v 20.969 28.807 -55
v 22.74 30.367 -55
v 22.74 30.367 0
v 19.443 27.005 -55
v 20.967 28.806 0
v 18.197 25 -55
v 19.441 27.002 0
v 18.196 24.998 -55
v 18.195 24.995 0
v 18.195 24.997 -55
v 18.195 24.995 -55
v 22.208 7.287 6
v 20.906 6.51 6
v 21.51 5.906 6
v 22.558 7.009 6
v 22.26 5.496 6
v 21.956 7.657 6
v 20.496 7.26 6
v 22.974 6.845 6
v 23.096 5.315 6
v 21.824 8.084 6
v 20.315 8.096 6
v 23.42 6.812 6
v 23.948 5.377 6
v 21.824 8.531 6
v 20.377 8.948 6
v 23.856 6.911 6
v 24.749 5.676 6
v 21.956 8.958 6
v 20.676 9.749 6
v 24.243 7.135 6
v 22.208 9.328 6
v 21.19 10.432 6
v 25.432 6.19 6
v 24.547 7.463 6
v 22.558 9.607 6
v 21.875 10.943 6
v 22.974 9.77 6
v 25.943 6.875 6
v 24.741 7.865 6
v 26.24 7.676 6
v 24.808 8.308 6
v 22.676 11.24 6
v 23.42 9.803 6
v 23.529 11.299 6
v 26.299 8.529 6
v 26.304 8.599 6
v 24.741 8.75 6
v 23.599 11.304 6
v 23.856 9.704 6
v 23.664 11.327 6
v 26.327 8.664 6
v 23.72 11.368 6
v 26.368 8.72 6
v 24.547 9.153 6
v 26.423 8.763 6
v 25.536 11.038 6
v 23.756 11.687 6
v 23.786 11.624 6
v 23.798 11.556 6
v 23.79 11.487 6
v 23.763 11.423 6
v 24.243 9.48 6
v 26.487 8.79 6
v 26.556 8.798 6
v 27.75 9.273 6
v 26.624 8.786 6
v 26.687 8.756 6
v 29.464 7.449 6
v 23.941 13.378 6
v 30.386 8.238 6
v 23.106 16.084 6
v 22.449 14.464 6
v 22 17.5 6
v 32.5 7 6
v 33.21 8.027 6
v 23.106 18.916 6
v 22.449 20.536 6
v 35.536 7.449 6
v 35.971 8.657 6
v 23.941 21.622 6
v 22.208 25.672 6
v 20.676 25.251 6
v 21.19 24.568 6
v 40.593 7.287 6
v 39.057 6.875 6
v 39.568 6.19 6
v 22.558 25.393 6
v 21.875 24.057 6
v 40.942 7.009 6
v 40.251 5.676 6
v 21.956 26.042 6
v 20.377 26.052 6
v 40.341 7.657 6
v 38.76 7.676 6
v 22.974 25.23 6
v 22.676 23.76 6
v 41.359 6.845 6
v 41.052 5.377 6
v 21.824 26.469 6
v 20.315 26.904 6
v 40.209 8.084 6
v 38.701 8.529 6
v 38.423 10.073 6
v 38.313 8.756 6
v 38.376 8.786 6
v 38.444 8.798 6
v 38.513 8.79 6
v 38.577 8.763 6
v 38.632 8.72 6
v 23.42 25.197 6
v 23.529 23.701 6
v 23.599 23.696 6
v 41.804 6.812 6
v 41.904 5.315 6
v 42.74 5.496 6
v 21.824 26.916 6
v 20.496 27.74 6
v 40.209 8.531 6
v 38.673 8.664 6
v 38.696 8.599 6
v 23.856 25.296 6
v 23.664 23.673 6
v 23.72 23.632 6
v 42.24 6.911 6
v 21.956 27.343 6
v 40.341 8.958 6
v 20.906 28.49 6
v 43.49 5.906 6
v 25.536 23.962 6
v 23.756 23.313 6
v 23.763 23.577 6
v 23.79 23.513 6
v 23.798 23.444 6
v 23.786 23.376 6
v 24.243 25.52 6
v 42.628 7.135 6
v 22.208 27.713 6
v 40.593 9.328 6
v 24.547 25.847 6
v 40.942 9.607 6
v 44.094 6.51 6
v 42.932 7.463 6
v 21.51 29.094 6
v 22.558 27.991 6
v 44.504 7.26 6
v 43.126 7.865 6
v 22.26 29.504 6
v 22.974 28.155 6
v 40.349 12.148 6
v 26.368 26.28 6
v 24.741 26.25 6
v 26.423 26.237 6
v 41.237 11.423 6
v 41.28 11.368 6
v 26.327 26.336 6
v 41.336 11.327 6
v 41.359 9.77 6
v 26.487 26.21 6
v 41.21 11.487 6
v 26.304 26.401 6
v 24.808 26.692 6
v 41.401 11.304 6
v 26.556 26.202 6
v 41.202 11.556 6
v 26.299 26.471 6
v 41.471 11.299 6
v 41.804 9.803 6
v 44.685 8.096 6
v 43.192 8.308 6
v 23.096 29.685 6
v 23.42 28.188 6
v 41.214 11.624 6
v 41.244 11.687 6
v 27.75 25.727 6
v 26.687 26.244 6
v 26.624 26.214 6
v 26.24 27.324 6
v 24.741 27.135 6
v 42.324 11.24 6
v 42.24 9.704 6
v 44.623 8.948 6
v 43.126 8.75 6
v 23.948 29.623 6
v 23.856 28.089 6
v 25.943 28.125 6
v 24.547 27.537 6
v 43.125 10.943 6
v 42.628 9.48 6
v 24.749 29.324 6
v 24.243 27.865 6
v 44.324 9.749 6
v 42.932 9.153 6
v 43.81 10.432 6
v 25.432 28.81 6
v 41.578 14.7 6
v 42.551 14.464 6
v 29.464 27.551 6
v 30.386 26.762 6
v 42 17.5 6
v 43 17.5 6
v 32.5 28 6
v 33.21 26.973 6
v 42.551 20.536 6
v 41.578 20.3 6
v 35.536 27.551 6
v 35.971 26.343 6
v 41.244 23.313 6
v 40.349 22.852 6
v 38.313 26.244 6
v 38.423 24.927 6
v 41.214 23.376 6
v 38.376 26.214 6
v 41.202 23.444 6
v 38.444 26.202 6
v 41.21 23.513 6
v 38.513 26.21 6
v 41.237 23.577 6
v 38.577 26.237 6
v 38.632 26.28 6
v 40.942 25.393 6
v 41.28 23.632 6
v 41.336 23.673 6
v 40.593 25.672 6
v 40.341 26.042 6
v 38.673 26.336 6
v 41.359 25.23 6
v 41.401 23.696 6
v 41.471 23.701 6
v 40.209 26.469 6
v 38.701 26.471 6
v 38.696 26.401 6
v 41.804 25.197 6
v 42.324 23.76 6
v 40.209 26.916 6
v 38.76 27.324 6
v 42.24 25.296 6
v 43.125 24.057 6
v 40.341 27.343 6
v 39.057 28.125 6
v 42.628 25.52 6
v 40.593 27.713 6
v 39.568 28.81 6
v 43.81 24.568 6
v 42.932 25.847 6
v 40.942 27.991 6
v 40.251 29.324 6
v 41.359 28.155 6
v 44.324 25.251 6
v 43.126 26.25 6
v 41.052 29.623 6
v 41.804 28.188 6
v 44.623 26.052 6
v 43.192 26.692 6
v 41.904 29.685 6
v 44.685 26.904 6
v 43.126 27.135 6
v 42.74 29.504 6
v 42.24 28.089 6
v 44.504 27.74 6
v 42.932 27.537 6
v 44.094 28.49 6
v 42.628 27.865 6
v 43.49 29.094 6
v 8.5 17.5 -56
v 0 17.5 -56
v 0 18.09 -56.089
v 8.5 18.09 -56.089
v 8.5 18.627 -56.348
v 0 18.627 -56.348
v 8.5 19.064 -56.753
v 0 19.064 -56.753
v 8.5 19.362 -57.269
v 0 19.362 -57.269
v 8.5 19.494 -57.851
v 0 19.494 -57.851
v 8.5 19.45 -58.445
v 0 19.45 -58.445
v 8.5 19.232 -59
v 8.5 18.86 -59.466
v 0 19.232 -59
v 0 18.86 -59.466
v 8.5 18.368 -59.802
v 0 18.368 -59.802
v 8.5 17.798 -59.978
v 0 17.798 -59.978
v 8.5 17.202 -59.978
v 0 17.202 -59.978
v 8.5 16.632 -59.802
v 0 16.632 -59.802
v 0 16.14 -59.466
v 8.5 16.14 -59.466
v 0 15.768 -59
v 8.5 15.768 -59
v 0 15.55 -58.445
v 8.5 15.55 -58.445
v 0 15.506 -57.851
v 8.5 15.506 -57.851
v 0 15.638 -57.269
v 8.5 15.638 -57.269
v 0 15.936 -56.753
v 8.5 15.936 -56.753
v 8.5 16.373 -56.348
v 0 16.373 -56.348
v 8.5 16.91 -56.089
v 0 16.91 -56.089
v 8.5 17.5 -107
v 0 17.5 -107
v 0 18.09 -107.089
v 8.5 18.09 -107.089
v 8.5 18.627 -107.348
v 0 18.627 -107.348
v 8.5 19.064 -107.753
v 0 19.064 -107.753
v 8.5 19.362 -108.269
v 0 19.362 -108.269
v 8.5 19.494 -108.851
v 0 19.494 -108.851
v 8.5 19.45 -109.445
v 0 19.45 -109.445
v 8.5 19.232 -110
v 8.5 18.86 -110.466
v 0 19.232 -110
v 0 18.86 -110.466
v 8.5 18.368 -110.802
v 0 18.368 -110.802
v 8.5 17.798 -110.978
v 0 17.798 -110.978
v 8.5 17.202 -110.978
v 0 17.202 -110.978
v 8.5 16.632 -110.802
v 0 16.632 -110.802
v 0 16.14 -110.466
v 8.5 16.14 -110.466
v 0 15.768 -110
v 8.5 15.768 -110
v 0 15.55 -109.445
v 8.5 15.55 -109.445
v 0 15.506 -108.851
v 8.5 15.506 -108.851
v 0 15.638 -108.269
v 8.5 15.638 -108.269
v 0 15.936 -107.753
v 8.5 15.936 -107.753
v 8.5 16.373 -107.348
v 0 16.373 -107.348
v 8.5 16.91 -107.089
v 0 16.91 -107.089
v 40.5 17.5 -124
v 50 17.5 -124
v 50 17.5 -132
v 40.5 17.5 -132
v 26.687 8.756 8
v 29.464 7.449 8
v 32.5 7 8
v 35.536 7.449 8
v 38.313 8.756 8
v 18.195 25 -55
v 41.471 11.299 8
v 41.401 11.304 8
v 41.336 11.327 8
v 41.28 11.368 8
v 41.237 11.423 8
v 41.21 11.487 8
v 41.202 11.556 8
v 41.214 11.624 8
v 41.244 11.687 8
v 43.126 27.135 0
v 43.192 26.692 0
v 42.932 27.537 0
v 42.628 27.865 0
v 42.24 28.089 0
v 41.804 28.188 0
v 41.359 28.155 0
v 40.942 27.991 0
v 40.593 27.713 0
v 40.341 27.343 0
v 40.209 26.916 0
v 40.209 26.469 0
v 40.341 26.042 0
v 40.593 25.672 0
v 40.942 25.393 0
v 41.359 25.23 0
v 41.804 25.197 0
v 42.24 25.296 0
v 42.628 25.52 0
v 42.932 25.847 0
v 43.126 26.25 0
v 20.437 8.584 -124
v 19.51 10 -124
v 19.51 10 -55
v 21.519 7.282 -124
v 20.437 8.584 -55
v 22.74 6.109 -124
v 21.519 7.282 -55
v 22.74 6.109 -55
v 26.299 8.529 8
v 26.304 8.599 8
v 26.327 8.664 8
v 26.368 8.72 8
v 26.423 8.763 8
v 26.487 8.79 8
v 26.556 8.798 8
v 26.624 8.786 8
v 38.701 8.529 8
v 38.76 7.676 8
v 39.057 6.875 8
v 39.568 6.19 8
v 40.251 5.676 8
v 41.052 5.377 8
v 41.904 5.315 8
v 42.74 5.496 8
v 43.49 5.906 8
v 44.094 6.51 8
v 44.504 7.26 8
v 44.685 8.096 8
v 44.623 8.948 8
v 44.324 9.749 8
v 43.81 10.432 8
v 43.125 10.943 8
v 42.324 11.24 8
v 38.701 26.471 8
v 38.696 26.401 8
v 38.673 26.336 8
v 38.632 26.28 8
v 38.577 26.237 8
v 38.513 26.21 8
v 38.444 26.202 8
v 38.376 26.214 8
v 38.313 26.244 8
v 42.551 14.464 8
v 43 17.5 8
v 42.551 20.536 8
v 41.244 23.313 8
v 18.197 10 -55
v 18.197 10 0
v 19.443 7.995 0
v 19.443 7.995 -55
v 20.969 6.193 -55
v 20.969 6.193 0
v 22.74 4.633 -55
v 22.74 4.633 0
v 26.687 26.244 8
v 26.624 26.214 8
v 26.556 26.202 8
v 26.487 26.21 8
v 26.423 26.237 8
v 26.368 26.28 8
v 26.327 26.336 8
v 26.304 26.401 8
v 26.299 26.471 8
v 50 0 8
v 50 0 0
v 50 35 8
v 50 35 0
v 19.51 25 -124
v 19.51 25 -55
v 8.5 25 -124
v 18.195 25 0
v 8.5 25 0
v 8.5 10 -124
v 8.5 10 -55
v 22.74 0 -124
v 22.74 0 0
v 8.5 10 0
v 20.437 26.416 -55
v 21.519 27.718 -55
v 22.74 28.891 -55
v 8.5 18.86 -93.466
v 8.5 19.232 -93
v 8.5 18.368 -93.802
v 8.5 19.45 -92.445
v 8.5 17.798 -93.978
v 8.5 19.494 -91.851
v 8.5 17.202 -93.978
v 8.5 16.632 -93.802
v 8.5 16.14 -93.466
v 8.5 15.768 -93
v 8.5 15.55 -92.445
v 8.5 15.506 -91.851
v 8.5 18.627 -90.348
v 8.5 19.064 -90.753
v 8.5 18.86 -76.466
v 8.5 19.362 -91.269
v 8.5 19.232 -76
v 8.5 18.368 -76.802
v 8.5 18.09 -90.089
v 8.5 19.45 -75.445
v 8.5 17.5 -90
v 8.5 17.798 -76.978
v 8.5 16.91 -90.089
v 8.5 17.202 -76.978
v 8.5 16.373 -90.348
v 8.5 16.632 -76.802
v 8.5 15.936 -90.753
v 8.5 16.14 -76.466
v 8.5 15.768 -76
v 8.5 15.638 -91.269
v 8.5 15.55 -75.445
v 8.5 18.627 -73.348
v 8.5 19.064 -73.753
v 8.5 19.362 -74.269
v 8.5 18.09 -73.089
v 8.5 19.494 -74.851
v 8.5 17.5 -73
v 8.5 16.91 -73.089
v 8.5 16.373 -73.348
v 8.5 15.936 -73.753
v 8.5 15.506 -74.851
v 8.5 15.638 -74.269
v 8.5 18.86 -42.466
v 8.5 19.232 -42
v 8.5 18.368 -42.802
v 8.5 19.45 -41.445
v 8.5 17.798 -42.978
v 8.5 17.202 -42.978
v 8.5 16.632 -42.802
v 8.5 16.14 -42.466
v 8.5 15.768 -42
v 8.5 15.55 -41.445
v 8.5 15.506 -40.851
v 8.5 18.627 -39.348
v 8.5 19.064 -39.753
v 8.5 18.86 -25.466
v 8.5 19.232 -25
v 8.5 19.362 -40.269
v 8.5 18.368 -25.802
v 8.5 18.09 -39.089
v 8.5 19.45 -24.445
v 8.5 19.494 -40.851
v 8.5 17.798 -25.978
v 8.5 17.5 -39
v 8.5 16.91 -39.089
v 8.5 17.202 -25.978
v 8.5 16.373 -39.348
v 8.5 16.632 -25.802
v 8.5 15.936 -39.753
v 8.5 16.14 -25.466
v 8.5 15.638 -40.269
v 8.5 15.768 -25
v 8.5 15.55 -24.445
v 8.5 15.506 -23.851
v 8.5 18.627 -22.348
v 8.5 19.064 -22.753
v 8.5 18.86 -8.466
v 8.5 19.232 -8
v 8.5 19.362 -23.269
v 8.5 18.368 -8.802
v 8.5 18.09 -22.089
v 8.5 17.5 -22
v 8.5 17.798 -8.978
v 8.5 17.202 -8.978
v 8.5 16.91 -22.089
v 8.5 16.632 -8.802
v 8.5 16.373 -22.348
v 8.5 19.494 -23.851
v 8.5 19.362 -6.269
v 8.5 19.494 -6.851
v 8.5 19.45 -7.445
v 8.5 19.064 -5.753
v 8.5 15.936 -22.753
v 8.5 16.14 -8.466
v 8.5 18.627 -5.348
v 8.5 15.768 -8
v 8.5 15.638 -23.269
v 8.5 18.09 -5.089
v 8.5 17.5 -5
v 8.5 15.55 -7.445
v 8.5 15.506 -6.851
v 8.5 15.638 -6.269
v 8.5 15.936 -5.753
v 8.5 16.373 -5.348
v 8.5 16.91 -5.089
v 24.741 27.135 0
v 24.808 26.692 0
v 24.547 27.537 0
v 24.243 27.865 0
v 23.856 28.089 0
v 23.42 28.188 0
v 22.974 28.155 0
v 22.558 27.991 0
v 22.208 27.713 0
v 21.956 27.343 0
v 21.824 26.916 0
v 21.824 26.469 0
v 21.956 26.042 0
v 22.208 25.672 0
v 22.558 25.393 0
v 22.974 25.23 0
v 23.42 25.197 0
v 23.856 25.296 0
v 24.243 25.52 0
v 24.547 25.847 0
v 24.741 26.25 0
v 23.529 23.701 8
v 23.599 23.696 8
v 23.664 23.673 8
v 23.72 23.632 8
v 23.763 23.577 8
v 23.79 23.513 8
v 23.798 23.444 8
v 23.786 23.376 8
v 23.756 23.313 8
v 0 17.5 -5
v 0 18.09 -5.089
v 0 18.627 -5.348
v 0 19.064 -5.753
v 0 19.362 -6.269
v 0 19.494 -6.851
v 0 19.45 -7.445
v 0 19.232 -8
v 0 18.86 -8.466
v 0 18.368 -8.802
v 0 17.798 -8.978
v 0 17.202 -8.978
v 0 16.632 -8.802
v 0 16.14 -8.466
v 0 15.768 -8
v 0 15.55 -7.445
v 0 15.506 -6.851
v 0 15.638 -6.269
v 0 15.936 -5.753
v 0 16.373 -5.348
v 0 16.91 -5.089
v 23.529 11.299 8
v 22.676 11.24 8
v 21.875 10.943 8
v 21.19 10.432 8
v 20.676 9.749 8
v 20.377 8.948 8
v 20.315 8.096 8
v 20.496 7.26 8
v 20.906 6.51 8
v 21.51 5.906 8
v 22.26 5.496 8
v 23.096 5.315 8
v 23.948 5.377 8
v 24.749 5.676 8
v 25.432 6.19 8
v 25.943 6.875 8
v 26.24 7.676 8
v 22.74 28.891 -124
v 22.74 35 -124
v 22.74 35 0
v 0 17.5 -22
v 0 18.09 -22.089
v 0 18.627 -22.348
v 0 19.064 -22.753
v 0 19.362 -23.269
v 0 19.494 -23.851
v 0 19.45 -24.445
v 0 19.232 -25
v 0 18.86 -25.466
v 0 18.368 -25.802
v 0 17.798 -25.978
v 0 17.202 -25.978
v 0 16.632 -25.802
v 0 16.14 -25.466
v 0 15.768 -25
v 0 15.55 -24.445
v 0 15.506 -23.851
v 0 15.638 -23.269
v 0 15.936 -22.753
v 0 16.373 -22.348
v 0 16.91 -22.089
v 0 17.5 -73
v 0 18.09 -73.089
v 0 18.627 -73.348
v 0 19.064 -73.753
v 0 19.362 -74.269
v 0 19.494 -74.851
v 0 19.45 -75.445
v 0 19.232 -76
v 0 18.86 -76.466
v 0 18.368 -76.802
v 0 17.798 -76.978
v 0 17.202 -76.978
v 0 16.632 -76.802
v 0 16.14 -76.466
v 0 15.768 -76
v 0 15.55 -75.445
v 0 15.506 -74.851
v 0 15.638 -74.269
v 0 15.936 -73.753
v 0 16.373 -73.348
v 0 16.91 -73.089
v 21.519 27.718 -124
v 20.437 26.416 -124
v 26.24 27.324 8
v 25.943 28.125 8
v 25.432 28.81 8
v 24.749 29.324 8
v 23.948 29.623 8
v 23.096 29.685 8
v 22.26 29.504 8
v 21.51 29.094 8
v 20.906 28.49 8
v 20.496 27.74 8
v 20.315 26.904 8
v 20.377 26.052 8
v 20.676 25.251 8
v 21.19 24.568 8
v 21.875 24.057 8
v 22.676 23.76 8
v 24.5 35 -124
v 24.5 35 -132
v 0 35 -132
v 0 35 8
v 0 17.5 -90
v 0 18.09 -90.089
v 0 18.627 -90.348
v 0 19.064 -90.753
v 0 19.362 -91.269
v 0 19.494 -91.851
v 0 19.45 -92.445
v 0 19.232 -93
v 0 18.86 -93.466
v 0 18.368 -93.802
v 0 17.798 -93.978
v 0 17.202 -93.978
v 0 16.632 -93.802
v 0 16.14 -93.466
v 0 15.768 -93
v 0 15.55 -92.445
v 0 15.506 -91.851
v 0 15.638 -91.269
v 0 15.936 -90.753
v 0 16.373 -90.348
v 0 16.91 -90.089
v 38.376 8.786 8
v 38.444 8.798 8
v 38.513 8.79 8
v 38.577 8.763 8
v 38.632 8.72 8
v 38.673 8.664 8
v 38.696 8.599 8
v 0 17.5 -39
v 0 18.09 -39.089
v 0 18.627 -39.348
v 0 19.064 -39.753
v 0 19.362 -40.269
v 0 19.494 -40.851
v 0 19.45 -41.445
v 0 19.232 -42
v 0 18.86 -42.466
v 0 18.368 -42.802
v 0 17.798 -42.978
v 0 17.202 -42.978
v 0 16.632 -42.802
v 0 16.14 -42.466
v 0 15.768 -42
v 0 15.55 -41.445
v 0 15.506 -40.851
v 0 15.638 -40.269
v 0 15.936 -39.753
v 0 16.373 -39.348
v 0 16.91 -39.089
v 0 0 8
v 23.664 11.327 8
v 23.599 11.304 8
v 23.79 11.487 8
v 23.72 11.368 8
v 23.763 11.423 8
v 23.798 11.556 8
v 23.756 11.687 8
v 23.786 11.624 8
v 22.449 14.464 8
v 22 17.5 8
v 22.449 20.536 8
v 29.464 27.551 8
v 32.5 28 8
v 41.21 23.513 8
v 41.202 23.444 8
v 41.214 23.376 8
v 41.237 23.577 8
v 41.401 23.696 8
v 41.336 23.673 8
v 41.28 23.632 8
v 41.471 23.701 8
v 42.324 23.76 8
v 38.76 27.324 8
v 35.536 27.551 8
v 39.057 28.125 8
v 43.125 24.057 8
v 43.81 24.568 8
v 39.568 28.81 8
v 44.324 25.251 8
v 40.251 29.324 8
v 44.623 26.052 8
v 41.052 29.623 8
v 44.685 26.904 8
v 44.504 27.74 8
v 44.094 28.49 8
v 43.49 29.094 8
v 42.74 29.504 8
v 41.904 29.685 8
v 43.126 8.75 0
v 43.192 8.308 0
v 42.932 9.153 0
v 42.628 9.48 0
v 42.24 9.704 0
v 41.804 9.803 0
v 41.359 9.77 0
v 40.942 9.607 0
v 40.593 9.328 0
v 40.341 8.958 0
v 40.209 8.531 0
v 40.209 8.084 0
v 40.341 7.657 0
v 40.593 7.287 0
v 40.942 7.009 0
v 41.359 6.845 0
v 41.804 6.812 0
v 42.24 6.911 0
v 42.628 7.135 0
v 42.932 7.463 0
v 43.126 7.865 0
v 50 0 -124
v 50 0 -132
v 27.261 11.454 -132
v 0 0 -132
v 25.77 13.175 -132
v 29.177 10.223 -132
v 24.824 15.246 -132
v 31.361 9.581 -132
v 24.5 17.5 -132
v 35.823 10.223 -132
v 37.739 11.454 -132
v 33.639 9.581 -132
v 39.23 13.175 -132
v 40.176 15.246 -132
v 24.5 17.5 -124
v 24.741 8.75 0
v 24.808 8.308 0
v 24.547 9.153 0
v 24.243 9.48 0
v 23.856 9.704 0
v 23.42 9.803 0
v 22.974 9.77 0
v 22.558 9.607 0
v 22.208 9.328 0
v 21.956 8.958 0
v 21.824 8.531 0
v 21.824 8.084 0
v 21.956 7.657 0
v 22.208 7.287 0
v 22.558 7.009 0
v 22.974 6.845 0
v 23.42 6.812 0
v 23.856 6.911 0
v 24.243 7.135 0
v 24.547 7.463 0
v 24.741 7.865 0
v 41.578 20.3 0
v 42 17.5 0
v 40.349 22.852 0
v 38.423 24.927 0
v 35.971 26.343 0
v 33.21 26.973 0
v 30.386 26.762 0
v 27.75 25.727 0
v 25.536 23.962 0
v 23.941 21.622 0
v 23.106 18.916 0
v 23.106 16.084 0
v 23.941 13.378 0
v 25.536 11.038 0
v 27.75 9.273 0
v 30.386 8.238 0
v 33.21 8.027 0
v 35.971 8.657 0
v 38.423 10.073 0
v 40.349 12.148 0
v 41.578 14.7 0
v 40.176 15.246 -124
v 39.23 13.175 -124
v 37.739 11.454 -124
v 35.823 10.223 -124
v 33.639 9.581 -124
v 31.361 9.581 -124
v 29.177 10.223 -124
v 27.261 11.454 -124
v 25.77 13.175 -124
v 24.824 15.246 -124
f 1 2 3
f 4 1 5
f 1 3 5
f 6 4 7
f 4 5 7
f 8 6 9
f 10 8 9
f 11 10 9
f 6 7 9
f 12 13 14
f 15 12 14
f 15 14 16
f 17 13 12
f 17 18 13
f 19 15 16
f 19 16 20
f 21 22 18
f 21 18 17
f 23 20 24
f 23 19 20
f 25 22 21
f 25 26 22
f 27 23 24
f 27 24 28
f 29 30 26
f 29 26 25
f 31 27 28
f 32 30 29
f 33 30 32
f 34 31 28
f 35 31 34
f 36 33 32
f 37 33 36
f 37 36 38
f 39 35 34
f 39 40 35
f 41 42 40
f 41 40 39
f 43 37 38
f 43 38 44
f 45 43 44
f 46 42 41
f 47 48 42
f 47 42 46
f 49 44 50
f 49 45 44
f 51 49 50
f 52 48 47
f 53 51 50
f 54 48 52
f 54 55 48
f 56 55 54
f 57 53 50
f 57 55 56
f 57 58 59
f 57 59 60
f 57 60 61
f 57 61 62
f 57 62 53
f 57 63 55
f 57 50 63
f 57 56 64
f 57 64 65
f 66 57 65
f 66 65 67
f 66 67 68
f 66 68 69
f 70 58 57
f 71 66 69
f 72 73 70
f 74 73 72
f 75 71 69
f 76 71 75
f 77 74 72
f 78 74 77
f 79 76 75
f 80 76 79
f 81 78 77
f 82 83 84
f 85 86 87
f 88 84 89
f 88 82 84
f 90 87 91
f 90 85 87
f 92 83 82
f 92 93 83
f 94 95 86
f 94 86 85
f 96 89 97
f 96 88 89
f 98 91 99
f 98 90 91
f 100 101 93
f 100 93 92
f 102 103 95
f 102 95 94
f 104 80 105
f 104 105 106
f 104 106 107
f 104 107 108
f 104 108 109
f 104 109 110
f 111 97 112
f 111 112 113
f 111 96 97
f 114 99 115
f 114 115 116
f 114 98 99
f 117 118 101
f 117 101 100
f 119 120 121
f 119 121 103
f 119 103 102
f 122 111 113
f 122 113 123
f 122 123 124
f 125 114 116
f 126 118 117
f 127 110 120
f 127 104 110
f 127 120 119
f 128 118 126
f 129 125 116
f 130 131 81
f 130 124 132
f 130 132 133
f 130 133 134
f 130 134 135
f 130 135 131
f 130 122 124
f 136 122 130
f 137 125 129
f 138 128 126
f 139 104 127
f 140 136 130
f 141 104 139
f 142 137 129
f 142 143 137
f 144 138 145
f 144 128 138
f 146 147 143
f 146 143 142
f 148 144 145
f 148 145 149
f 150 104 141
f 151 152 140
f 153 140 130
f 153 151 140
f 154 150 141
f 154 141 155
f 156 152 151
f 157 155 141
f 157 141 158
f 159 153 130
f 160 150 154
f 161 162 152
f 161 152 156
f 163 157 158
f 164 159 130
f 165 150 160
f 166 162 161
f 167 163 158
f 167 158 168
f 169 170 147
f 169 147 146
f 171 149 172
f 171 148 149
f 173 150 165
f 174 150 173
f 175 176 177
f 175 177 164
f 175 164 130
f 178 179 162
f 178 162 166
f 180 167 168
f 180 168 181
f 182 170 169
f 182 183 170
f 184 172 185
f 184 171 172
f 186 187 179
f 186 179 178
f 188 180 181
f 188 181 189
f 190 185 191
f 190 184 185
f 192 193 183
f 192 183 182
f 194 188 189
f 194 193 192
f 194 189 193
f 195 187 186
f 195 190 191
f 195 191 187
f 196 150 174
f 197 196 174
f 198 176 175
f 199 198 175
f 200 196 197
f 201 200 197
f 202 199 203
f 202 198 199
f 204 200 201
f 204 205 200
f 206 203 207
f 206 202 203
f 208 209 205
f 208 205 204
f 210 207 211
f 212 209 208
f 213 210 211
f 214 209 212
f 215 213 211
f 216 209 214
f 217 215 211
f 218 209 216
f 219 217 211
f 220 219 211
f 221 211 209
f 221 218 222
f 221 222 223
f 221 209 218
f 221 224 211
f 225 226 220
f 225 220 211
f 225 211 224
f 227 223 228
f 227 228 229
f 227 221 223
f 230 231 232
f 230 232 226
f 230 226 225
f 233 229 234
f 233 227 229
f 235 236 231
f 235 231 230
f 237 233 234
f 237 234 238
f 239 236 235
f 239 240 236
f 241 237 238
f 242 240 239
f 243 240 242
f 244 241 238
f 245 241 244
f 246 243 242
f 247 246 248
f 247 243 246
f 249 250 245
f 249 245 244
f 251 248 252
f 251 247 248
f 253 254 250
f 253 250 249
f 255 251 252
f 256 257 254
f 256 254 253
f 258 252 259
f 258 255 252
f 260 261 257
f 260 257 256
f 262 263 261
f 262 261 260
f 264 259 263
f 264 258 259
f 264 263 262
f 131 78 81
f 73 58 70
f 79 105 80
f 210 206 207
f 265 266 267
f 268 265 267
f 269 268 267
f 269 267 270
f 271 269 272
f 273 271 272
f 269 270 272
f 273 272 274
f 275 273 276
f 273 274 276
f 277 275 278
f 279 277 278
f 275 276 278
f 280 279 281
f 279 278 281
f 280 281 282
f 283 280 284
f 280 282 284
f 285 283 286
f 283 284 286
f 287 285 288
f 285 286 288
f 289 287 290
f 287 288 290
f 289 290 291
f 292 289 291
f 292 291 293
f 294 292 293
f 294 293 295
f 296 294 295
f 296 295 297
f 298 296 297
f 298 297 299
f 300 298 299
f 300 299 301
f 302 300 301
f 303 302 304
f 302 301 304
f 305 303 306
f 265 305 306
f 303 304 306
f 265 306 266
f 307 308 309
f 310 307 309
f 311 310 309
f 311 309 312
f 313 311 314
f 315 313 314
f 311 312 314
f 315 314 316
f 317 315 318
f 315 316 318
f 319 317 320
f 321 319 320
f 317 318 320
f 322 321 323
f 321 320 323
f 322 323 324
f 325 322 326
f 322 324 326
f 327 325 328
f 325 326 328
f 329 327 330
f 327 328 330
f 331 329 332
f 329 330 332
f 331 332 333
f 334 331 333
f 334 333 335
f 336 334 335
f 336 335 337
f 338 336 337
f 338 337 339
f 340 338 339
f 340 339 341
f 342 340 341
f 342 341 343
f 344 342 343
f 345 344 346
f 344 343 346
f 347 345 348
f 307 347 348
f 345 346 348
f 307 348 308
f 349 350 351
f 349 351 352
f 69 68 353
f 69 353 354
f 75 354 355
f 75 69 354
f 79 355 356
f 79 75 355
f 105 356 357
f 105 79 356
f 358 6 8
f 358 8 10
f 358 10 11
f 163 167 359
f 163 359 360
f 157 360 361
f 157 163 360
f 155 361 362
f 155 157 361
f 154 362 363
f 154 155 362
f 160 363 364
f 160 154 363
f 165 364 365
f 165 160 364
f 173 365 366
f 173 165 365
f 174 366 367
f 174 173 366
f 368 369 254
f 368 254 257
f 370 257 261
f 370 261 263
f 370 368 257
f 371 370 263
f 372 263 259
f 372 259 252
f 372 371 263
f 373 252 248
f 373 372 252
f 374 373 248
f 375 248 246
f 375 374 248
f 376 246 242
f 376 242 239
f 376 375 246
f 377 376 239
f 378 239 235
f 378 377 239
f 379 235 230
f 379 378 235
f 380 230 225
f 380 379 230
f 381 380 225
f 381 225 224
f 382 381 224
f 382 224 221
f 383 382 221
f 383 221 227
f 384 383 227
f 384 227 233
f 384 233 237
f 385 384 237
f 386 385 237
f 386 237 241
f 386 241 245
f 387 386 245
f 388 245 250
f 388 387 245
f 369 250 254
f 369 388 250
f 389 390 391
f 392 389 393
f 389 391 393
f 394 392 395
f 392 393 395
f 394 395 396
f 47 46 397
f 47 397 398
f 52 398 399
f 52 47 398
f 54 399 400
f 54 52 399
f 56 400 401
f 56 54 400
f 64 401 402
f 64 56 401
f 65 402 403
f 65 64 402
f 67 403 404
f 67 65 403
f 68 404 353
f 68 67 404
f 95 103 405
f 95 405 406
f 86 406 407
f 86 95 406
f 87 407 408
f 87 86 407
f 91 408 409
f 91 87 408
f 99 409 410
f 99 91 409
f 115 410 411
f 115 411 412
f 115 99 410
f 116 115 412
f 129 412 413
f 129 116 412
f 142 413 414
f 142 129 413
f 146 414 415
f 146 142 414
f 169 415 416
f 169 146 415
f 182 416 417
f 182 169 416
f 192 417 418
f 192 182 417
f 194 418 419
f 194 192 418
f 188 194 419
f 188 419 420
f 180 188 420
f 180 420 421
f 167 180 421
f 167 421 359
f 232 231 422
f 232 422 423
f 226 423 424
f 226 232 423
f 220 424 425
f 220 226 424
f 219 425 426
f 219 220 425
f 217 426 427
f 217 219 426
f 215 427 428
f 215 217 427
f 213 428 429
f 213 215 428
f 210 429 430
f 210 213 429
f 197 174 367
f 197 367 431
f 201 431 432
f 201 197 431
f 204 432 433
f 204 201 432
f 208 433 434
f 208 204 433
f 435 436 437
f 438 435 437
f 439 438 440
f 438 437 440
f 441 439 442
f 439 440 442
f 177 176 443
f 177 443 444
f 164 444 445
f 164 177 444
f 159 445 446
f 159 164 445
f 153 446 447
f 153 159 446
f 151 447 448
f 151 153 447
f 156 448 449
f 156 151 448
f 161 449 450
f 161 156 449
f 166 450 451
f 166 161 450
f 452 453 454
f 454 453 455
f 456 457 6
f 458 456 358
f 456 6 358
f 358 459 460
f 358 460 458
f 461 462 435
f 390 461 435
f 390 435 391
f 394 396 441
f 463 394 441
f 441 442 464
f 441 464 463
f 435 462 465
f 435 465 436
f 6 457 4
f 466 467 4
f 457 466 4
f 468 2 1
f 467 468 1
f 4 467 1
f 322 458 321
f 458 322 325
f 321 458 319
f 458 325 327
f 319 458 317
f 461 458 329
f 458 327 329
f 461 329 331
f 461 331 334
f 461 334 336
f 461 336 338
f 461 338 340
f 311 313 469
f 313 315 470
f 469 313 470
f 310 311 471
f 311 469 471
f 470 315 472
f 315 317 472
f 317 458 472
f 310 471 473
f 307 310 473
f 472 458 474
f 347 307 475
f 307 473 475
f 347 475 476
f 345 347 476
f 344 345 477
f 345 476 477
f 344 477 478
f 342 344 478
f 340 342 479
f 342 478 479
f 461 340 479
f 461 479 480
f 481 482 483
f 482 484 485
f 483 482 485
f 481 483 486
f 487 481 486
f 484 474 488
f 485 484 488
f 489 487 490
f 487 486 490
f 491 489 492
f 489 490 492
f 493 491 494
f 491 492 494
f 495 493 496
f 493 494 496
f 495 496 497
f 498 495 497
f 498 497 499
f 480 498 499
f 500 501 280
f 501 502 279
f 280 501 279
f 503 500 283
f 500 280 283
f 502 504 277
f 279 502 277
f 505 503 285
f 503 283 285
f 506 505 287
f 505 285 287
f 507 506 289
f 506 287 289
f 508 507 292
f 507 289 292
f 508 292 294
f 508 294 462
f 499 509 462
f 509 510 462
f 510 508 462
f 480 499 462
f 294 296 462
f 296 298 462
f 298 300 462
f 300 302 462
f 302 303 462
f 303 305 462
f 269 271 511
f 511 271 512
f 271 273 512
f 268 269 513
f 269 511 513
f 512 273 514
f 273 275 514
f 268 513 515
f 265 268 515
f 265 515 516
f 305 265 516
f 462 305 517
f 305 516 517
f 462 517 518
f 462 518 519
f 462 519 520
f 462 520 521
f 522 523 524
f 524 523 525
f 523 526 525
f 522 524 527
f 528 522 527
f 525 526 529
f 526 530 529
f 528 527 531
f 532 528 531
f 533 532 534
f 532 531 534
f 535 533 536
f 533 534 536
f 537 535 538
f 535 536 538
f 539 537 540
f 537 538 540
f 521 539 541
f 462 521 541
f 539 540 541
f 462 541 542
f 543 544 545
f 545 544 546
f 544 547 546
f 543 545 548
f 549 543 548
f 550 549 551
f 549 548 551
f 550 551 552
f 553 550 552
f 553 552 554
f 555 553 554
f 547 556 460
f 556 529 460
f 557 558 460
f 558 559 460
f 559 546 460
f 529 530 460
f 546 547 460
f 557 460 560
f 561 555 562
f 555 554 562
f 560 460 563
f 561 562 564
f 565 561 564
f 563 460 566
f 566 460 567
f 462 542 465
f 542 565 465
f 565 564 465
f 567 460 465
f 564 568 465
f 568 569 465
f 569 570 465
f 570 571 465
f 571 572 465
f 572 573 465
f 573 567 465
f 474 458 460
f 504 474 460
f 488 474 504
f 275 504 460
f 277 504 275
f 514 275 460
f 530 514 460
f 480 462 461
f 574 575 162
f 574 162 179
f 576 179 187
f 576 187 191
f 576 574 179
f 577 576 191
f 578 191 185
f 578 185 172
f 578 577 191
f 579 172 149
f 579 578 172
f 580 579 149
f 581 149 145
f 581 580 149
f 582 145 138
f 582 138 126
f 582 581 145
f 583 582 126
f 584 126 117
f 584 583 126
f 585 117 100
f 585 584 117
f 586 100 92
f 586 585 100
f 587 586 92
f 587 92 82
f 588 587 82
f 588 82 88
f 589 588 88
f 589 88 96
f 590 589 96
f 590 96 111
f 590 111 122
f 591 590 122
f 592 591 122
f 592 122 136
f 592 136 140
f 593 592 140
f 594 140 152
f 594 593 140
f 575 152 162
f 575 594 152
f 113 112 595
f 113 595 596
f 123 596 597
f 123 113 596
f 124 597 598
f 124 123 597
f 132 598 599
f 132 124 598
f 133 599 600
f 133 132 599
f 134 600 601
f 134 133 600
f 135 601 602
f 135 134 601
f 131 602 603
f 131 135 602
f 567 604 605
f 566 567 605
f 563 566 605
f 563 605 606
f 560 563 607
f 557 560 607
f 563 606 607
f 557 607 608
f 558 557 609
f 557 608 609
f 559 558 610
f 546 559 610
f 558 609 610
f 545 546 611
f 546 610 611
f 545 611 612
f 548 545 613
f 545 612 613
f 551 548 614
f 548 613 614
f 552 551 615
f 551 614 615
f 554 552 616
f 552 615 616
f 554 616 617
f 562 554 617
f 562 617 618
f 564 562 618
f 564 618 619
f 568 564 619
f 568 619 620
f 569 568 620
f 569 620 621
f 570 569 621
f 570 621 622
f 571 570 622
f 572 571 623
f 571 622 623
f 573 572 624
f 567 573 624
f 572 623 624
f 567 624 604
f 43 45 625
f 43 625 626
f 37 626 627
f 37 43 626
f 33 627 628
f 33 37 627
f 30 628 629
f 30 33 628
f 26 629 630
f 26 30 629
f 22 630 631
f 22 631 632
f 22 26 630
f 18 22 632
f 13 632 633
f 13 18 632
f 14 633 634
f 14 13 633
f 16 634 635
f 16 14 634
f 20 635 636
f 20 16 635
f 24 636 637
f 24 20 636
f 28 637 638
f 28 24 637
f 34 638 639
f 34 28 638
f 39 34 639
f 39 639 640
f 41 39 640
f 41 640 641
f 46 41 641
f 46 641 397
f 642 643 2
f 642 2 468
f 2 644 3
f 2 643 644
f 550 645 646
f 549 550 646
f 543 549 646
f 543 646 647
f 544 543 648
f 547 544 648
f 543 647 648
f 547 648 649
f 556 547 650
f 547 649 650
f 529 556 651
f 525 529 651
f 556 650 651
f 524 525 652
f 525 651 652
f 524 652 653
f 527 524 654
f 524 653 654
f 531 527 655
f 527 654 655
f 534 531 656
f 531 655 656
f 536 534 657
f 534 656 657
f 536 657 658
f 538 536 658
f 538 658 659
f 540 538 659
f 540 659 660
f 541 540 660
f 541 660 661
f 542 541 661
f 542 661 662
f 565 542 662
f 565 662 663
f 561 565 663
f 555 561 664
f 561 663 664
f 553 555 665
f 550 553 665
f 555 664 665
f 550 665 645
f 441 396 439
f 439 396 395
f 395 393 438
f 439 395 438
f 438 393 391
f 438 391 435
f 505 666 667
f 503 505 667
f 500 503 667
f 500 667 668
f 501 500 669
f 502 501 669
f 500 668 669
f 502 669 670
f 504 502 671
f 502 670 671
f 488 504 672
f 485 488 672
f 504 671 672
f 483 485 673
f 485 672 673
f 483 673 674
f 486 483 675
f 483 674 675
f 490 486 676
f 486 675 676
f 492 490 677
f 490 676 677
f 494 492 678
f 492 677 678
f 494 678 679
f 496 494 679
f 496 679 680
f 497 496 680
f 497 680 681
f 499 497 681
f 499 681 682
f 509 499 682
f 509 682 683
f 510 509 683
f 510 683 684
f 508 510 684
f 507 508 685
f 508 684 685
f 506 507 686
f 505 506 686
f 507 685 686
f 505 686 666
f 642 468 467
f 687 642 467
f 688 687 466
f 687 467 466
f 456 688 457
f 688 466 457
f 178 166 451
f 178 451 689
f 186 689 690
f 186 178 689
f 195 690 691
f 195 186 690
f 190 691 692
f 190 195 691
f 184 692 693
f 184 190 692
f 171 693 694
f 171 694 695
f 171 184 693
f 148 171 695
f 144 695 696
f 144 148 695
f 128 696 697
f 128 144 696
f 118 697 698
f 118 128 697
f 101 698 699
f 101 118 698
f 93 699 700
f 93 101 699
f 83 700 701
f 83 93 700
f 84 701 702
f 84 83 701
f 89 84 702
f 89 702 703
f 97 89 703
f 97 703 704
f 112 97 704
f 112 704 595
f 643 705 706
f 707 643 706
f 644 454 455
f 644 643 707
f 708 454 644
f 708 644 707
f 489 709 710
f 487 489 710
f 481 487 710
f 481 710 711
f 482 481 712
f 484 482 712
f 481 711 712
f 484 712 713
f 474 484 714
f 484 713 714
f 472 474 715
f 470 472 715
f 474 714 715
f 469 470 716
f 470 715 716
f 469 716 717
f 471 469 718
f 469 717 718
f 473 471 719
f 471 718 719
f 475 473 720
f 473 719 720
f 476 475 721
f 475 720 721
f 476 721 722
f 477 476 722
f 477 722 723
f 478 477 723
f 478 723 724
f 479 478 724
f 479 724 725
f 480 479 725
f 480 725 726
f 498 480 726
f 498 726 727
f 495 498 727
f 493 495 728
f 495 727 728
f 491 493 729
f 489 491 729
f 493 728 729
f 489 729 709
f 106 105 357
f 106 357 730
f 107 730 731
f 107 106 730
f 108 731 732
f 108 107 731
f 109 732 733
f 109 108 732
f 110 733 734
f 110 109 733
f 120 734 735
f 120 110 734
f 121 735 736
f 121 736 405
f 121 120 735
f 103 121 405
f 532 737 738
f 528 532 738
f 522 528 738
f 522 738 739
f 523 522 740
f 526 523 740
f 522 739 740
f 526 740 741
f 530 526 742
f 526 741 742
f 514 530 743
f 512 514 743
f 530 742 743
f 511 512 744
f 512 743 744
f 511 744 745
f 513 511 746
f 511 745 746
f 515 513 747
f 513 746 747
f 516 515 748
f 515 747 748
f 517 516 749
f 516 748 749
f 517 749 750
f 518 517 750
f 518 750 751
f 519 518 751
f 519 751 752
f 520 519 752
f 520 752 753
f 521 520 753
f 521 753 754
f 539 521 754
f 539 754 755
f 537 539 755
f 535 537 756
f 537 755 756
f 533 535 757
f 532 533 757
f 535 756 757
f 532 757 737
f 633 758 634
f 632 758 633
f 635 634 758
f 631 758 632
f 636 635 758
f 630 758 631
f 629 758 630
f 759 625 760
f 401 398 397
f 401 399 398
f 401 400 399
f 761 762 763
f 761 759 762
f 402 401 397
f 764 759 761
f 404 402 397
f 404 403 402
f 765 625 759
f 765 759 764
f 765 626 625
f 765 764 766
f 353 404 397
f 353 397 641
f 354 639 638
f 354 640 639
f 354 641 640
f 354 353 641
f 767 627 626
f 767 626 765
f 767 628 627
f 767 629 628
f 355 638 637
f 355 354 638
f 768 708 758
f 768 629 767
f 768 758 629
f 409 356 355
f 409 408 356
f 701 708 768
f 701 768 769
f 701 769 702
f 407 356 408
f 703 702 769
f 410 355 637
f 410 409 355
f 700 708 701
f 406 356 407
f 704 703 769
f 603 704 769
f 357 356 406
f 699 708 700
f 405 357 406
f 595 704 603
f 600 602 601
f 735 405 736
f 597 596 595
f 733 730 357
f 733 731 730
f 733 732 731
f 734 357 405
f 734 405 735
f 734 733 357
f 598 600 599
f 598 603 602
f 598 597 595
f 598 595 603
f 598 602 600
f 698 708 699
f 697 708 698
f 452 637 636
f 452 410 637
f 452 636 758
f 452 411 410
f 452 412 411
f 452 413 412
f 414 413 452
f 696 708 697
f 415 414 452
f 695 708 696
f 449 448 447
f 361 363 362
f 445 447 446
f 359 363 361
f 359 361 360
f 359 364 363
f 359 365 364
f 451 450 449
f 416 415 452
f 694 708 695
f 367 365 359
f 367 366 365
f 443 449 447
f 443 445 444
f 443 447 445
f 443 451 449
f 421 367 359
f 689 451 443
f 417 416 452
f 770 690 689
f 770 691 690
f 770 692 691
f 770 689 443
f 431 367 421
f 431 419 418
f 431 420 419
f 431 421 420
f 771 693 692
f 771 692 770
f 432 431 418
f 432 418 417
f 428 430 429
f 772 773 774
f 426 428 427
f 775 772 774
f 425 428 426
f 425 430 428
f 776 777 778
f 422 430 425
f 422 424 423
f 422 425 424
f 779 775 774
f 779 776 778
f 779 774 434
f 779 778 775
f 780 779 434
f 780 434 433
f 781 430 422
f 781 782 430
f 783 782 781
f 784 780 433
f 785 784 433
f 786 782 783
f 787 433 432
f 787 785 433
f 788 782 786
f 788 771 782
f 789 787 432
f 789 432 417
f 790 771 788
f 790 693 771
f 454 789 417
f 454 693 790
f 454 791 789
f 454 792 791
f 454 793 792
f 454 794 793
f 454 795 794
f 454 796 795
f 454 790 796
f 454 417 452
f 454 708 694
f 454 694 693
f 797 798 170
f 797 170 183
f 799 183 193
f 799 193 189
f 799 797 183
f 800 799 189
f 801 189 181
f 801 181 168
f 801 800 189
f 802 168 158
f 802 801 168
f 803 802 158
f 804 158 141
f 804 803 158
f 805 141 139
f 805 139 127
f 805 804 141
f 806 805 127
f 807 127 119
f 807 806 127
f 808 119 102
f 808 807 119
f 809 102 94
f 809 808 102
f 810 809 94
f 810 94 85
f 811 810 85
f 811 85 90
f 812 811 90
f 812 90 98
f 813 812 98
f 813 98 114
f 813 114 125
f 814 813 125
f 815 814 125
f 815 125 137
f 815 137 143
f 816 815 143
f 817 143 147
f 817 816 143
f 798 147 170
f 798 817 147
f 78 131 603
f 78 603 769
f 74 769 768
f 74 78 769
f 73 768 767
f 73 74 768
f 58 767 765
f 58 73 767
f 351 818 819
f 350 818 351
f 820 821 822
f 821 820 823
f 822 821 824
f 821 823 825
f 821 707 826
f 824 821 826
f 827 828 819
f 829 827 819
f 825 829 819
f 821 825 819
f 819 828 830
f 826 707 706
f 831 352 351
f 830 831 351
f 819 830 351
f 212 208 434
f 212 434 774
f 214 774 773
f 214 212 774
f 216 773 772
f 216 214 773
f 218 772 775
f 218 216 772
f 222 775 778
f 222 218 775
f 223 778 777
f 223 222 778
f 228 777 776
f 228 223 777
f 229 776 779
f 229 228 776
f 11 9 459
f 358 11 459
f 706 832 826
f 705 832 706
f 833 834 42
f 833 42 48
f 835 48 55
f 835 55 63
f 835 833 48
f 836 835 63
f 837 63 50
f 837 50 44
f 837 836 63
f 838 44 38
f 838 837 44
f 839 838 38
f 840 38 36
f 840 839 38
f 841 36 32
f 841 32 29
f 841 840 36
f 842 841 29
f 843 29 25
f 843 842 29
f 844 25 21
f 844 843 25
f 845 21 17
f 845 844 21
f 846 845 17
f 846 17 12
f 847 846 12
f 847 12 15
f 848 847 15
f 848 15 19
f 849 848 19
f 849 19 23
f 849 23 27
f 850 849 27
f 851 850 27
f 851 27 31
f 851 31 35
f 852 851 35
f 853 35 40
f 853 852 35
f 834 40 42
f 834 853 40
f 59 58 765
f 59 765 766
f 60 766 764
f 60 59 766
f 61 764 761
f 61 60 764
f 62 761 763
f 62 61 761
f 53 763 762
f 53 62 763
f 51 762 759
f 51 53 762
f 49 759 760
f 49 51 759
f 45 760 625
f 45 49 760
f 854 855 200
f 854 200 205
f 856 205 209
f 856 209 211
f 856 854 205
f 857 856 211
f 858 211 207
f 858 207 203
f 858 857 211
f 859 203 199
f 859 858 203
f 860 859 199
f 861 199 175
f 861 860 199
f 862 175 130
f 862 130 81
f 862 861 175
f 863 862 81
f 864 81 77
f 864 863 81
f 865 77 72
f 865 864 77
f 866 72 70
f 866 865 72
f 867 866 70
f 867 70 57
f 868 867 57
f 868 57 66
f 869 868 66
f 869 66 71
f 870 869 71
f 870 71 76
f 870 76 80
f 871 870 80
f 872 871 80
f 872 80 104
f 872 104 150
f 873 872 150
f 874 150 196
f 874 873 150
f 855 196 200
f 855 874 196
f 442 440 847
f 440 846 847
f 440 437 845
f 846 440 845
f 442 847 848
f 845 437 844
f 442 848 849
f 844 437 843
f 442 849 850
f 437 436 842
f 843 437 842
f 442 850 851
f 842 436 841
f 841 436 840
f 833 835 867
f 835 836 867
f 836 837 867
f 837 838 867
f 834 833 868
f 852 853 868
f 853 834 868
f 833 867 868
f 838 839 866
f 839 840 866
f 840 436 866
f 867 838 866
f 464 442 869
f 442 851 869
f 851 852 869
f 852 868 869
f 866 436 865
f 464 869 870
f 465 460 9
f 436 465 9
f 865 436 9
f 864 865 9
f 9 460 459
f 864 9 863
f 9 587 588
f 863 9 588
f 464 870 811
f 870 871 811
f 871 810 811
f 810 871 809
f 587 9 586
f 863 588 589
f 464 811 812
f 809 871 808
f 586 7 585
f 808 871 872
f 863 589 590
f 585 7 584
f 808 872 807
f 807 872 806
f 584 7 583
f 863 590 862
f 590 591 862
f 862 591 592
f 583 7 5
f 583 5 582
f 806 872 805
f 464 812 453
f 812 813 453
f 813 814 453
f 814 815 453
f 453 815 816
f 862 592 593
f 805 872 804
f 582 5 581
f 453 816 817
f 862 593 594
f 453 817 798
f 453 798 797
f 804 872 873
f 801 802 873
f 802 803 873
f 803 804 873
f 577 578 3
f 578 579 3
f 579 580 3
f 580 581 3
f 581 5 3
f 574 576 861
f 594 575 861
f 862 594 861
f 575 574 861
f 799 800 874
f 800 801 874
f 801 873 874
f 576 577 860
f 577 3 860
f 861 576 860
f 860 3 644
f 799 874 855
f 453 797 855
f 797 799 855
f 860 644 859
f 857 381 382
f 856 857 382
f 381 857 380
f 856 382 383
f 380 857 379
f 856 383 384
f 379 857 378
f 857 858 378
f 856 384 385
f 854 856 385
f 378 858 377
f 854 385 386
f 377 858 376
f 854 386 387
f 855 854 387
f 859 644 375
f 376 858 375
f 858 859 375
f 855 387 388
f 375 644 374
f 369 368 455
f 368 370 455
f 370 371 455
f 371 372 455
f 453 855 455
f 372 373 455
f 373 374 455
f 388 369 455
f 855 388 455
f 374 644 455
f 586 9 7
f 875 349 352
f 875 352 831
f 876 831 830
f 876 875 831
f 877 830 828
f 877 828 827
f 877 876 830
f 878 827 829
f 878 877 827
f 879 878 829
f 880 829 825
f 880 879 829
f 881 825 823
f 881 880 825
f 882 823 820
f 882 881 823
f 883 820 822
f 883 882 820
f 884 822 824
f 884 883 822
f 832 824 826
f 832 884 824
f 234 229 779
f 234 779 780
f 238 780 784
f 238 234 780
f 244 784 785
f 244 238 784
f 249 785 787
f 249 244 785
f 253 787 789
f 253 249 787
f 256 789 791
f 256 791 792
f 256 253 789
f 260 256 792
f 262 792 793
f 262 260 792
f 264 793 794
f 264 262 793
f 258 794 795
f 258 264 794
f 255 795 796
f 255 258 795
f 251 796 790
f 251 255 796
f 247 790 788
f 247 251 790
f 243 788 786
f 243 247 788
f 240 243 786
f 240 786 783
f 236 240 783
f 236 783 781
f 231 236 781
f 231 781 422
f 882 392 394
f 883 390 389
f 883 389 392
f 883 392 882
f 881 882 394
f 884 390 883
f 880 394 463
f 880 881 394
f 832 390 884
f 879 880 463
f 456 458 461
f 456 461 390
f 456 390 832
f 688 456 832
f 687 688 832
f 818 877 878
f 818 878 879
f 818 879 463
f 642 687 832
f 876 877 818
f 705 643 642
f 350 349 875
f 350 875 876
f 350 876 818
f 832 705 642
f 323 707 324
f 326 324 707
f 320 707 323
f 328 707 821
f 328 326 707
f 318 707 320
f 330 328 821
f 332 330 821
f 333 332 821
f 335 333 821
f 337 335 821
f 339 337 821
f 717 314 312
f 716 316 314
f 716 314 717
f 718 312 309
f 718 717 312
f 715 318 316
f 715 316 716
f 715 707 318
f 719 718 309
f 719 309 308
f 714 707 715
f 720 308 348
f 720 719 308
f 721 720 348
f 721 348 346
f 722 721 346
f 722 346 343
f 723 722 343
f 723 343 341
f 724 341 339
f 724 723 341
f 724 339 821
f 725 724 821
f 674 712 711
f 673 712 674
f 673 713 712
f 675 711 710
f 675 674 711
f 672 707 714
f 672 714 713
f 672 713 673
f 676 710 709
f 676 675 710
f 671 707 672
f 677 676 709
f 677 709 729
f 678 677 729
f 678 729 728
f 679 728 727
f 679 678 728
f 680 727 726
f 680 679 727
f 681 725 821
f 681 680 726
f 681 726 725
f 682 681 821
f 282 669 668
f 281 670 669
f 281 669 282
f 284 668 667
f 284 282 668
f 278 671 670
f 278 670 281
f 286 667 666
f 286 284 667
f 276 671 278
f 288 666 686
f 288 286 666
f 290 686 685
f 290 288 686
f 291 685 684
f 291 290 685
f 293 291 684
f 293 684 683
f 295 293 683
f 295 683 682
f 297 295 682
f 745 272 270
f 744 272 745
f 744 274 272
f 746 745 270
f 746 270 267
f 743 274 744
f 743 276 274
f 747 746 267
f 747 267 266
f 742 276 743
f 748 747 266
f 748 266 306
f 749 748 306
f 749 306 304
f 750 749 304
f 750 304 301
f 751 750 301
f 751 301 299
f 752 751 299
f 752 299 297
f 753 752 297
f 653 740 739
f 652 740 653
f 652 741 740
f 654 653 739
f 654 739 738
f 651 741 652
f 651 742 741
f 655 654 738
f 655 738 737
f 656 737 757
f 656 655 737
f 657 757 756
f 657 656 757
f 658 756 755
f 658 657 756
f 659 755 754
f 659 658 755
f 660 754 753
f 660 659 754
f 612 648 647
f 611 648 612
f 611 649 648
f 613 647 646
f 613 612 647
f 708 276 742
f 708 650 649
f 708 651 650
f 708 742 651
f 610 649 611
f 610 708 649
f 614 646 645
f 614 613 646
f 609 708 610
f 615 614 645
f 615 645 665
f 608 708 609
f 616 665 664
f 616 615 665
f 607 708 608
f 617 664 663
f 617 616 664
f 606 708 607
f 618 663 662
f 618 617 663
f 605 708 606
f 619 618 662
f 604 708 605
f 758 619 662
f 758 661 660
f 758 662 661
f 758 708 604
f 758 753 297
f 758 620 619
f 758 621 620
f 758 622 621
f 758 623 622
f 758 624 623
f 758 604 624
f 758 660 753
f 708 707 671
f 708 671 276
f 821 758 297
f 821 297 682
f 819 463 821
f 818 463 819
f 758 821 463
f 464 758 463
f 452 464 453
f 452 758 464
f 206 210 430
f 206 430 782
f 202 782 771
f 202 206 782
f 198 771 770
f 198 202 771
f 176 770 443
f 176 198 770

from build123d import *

# Parameters (mm, degrees)
SKETCH1_W            = 50
SKETCH1_H            = 35
SKETCH1_R            = 9.5
SKETCH1_R_2          = 1.5
BOSS_EXTRUDE3_DEPTH  = 6
SKETCH4_W            = 50
SKETCH4_H            = 35
BOSS_EXTRUDE5_DEPTH  = 2
BOSS_EXTRUDE6_DEPTH  = 55
BOSS_EXTRUDE9_DEPTH  = 69
BOSS_EXTRUDE10_DEPTH = 8
SKETCH9_R            = 2
CUT_EXTRUDE1_DEPTH   = 8.5


with BuildPart() as part:
    # Sketch1 → Boss-Extrude3 (new body)
    with BuildSketch(Plane.XY):
        with Locations((25, 17.5)):
            Rectangle(SKETCH1_W, SKETCH1_H)
        with Locations((32.5, 17.5)):
            Circle(SKETCH1_R, mode=Mode.SUBTRACT)
        with Locations((41.692388155, 26.692388155)):
            Circle(SKETCH1_R_2, mode=Mode.SUBTRACT)
        with Locations((41.692388155, 8.307611845)):
            Circle(SKETCH1_R_2, mode=Mode.SUBTRACT)
        with Locations((23.307611845, 8.307611845)):
            Circle(SKETCH1_R_2, mode=Mode.SUBTRACT)
        with Locations((23.307611845, 26.692388155)):
            Circle(SKETCH1_R_2, mode=Mode.SUBTRACT)
    extrude(amount=BOSS_EXTRUDE3_DEPTH)

    # Sketch4 → Boss-Extrude5 (add)
    with BuildSketch(Plane.XY.offset(6)):
        with Locations((25, 17.5)):
            Rectangle(SKETCH4_W, SKETCH4_H)
        with BuildLine():
            ThreePointArc((26.299419693, 26.47083501), (21.186291501, 28.813708499), (23.52916499, 23.700580307))
            ThreePointArc((23.52916499, 23.700580307), (23.763454109, 23.57743344), (23.755822455, 23.312861521))
            ThreePointArc((23.755822455, 23.312861521), (22, 17.5), (23.755822455, 11.687138479))
            ThreePointArc((23.755822455, 11.687138479), (23.763454109, 11.42256656), (23.52916499, 11.299419693))
            ThreePointArc((23.52916499, 11.299419693), (21.186291501, 6.186291501), (26.299419693, 8.52916499))
            ThreePointArc((26.299419693, 8.52916499), (26.42256656, 8.763454109), (26.687138479, 8.755822455))
            ThreePointArc((26.687138479, 8.755822455), (32.5, 7), (38.312861521, 8.755822455))
            ThreePointArc((38.312861521, 8.755822455), (38.57743344, 8.763454109), (38.700580307, 8.52916499))
            ThreePointArc((38.700580307, 8.52916499), (43.813708499, 6.186291501), (41.47083501, 11.299419693))
            ThreePointArc((41.47083501, 11.299419693), (41.236545891, 11.42256656), (41.244177545, 11.687138479))
            ThreePointArc((41.244177545, 11.687138479), (43, 17.5), (41.244177545, 23.312861521))
            ThreePointArc((41.244177545, 23.312861521), (41.236545891, 23.57743344), (41.47083501, 23.700580307))
            ThreePointArc((41.47083501, 23.700580307), (43.813708499, 28.813708499), (38.700580307, 26.47083501))
            ThreePointArc((38.700580307, 26.47083501), (38.57743344, 26.236545891), (38.312861521, 26.244177545))
            ThreePointArc((38.312861521, 26.244177545), (32.5, 28), (26.687138479, 26.244177545))
            ThreePointArc((26.687138479, 26.244177545), (26.42256656, 26.236545891), (26.299419693, 26.47083501))
        make_face(mode=Mode.SUBTRACT)
    extrude(amount=BOSS_EXTRUDE5_DEPTH)

    # Sketch8 → Boss-Extrude6 (add)
    with BuildSketch(Plane(origin=(0, 0, 0), x_dir=(-1, 0, 0), z_dir=(0, 0, -1))):
        with BuildLine():
            Line((-8.5, 35), (-22.740329685, 35))
            Line((-22.740329685, 35), (-22.740329685, 30.367452558))
            ThreePointArc((-22.740329685, 30.367452558), (-20.171344576, 27.9320063), (-18.194683381, 24.99535966))
            Line((-18.194683381, 24.99535966), (-18.194683381, 25))
            Line((-18.194683381, 25), (-8.5, 25))
            Line((-8.5, 25), (-8.5, 10.000000197))
            Line((-8.5, 10.000000197), (-18.197115572, 10.000000197))
            ThreePointArc((-18.197115572, 10.000000197), (-20.17303677, 7.065994176), (-22.740329685, 4.632547442))
            Line((-22.740329685, 4.632547442), (-22.740329685, 0))
            Line((-22.740329685, 0), (-8.5, 0))
            Line((-8.5, 0), (0, 0))
            Line((0, 0), (0, 10.000000197))
            Line((0, 10.000000197), (0, 25))
            Line((0, 25), (0, 35))
            Line((0, 35), (-8.5, 35))
        make_face()
    extrude(amount=BOSS_EXTRUDE6_DEPTH)

    # Sketch13 → Boss-Extrude9 (add)
    with BuildSketch(Plane(origin=(0, 0, -55), x_dir=(-1, 0, 0), z_dir=(0, 0, -1))):
        with BuildLine():
            Line((-8.5, 25), (-8.5, 10))
            Line((-8.5, 10), (-19.509618943, 10))
            ThreePointArc((-19.509618943, 10), (-20.959823947, 7.917498413), (-22.740329685, 6.109265373))
            Line((-22.740329685, 6.109265373), (-22.740329685, 0))
            Line((-22.740329685, 0), (0, 0))
            Line((0, 0), (0, 35))
            Line((0, 35), (-22.740329685, 35))
            Line((-22.740329685, 35), (-22.740329685, 28.890734627))
            ThreePointArc((-22.740329685, 28.890734627), (-20.959823947, 27.082501587), (-19.509618943, 25))
            Line((-19.509618943, 25), (-8.5, 25))
        make_face()
    extrude(amount=BOSS_EXTRUDE9_DEPTH)

    # Sketch14 → Boss-Extrude10 (add)
    with BuildSketch(Plane(origin=(0, 0, -124), x_dir=(-1, 0, 0), z_dir=(0, 0, -1))):
        with BuildLine():
            Line((-24.5, 17.5), (-24.5, 35))
            Line((-24.5, 35), (0, 35))
            Line((0, 35), (0, 0))
            Line((0, 0), (-50, 0))
            Line((-50, 0), (-50, 17.5))
            Line((-50, 17.5), (-40.5, 17.5))
            ThreePointArc((-40.5, 17.5), (-32.5, 9.5), (-24.5, 17.5))
        make_face()
    extrude(amount=BOSS_EXTRUDE10_DEPTH)

    # Sketch9 → Cut-Extrude1 (cut)
    with BuildSketch(Plane.ZY):
        with Locations((-7, 17.5)):
            Circle(SKETCH9_R)
        with Locations((-24, 17.5)):
            Circle(SKETCH9_R)
        with Locations((-41, 17.5)):
            Circle(SKETCH9_R)
        with Locations((-58, 17.5)):
            Circle(SKETCH9_R)
        with Locations((-75, 17.5)):
            Circle(SKETCH9_R)
        with Locations((-92, 17.5)):
            Circle(SKETCH9_R)
        with Locations((-109, 17.5)):
            Circle(SKETCH9_R)
    extrude(amount=-CUT_EXTRUDE1_DEPTH, mode=Mode.SUBTRACT)


solid = part.part
